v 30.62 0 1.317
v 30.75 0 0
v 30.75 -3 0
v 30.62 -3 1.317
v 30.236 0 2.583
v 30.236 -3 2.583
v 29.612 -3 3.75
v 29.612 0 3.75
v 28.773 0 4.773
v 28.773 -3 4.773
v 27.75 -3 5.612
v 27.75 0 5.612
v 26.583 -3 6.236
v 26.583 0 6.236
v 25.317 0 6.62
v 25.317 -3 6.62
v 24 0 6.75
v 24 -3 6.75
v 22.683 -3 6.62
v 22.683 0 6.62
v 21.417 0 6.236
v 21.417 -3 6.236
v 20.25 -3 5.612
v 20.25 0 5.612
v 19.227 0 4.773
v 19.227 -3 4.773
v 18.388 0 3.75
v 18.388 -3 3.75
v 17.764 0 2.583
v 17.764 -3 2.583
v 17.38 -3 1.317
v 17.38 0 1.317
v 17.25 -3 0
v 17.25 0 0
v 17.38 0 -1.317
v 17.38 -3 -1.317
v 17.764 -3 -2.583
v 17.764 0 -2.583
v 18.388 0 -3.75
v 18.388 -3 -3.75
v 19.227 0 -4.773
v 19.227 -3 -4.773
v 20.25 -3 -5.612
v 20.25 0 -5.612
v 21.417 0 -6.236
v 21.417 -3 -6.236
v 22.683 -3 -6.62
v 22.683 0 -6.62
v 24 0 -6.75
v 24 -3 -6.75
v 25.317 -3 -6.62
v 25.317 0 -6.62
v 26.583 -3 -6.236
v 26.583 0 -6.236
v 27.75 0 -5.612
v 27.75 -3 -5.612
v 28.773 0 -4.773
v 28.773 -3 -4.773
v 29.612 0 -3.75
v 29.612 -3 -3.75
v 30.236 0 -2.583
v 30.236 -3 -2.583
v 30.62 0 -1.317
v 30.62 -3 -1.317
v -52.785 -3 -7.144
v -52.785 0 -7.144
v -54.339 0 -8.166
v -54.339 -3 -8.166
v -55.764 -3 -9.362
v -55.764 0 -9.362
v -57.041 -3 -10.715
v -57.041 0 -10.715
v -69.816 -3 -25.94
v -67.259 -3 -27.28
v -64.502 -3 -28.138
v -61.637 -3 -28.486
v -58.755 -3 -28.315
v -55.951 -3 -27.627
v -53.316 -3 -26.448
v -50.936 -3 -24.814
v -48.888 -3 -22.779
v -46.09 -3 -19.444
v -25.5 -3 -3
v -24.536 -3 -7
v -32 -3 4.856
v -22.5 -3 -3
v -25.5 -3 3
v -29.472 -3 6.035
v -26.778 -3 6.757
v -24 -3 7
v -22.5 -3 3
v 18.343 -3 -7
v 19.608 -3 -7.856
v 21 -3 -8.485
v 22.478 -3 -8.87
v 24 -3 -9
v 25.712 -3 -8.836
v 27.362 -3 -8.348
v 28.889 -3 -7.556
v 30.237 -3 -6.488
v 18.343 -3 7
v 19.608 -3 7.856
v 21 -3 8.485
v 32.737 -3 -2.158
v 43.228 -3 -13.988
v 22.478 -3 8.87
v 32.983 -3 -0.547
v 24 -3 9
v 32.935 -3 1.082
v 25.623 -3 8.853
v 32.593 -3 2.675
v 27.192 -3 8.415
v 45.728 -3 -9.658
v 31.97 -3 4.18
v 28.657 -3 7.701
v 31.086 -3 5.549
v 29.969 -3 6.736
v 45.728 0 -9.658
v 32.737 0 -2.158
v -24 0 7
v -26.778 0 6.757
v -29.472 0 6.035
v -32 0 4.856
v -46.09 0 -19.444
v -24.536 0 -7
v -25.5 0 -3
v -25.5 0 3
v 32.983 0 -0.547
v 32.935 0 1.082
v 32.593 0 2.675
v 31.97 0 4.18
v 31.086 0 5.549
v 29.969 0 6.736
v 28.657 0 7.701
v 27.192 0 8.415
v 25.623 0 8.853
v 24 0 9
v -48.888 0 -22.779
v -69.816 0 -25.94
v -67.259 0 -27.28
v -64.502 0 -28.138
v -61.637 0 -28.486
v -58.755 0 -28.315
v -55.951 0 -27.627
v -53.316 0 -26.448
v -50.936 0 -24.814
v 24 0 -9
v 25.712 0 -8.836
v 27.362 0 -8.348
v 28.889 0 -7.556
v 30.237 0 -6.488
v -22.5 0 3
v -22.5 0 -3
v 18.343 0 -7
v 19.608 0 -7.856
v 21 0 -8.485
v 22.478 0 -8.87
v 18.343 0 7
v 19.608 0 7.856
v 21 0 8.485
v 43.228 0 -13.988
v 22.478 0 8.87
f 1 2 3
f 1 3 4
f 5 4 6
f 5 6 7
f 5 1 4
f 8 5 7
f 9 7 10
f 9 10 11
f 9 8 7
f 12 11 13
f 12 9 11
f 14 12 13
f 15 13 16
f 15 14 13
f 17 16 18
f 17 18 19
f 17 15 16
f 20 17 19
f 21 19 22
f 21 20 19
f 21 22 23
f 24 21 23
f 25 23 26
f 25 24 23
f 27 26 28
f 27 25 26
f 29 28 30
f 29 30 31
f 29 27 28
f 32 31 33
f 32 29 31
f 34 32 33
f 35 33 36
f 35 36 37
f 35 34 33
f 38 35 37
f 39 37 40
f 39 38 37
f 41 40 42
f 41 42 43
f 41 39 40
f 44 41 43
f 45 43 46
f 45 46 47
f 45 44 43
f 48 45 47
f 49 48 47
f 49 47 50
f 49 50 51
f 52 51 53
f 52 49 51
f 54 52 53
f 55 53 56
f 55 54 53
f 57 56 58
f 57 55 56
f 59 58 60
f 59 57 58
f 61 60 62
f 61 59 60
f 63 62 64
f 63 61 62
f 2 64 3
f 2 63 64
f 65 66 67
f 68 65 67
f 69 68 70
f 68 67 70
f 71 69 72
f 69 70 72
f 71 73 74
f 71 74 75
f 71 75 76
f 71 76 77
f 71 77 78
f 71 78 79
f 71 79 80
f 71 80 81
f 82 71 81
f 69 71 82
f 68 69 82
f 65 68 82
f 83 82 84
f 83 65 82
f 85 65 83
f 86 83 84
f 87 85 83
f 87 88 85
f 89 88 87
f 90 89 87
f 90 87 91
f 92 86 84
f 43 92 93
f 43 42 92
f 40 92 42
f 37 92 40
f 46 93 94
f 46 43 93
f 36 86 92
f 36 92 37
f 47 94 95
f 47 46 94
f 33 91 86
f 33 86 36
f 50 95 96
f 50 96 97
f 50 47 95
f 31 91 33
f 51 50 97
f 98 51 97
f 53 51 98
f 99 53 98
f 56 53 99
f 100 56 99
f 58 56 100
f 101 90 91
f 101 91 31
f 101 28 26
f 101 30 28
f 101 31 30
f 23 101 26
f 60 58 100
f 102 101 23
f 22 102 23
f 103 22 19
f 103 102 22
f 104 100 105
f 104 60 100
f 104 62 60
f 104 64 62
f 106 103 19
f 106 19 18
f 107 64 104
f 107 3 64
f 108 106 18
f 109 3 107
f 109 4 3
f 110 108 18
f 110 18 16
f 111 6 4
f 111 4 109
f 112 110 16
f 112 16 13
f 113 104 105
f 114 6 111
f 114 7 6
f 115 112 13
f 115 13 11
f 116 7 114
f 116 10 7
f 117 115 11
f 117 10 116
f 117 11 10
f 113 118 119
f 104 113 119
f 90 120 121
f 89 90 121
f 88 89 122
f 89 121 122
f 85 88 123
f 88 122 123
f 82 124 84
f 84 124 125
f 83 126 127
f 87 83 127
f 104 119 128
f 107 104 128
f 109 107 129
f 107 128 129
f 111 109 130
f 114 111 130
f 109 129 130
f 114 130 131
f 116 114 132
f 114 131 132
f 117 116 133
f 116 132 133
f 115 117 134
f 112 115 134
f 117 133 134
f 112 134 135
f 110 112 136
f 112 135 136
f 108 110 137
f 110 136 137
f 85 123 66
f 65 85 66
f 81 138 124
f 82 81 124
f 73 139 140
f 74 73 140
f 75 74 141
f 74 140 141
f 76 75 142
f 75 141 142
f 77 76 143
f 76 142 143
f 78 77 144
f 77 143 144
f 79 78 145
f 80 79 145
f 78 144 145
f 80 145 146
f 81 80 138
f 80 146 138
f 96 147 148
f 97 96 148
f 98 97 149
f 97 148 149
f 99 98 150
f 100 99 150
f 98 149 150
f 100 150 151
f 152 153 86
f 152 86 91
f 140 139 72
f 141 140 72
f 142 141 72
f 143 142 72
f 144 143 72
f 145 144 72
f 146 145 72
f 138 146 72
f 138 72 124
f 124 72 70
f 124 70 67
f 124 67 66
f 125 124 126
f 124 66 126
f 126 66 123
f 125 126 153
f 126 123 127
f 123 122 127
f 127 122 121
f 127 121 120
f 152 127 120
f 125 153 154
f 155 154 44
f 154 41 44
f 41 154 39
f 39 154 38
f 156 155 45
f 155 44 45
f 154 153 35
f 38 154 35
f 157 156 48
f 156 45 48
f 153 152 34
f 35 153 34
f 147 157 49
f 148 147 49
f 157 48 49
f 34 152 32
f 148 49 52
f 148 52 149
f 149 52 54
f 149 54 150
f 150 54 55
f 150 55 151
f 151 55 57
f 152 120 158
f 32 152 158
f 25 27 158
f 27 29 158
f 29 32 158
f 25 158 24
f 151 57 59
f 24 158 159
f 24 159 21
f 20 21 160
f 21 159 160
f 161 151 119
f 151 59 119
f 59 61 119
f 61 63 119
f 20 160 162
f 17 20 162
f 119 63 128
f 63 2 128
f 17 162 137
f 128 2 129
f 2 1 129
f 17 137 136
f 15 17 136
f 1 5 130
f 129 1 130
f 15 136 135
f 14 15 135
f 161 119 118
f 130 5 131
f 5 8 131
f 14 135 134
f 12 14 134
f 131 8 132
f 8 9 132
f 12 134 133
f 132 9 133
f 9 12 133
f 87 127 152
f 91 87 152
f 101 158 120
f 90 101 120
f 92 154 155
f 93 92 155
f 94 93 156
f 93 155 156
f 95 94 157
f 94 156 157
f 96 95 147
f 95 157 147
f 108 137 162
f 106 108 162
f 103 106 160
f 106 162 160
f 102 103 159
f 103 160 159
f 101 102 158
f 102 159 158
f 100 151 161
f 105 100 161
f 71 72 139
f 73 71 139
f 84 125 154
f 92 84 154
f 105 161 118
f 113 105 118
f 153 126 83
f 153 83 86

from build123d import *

# Parameters (mm, degrees)
F0_W     = 3
F0_H     = 6
F0_R     = 6.75
F1_DEPTH = 3


with BuildPart() as f1:
    # F0 (on Front) → F1 (new body)
    with BuildSketch(Plane.XZ):
        with BuildLine():
            Line((-46.090017, -19.444276), (-24.535898, -7))
            Line((-24.535898, -7), (18.343146, -7))
            ThreePointArc((18.343146, -7), (21, -8.485281), (24, -9))
            ThreePointArc((24, -9), (27.362164, -8.348404), (30.23749, -6.487968))
            Line((30.23749, -6.487968), (43.227871, -13.987968))
            Line((43.227871, -13.987968), (45.727871, -9.657841))
            Line((45.727871, -9.657841), (32.73749, -2.157841))
            ThreePointArc((32.73749, -2.157841), (31.085921, 5.548848), (24, 9))
            ThreePointArc((24, 9), (21, 8.485281), (18.343146, 7))
            Line((18.343146, 7), (-24, 7))
            ThreePointArc((-24, 7), (-28.141105, 6.454813), (-32, 4.856406))
            Line((-32, 4.856406), (-52.78461, -7.143594))
            ThreePointArc((-52.78461, -7.143594), (-55.069211, -8.743289), (-57.041321, -10.715398))
            Line((-57.041321, -10.715398), (-69.816408, -25.940155))
            ThreePointArc((-69.816408, -25.940155), (-58.754651, -28.314504), (-48.887849, -22.778603))
            Line((-48.887849, -22.778603), (-46.090017, -19.444276))
        make_face()
        with Locations((-24, 0)):
            Rectangle(F0_W, F0_H, mode=Mode.SUBTRACT)
        with Locations((24, 0)):
            Circle(F0_R, mode=Mode.SUBTRACT)
    extrude(amount=F1_DEPTH)


solid = f1.part
